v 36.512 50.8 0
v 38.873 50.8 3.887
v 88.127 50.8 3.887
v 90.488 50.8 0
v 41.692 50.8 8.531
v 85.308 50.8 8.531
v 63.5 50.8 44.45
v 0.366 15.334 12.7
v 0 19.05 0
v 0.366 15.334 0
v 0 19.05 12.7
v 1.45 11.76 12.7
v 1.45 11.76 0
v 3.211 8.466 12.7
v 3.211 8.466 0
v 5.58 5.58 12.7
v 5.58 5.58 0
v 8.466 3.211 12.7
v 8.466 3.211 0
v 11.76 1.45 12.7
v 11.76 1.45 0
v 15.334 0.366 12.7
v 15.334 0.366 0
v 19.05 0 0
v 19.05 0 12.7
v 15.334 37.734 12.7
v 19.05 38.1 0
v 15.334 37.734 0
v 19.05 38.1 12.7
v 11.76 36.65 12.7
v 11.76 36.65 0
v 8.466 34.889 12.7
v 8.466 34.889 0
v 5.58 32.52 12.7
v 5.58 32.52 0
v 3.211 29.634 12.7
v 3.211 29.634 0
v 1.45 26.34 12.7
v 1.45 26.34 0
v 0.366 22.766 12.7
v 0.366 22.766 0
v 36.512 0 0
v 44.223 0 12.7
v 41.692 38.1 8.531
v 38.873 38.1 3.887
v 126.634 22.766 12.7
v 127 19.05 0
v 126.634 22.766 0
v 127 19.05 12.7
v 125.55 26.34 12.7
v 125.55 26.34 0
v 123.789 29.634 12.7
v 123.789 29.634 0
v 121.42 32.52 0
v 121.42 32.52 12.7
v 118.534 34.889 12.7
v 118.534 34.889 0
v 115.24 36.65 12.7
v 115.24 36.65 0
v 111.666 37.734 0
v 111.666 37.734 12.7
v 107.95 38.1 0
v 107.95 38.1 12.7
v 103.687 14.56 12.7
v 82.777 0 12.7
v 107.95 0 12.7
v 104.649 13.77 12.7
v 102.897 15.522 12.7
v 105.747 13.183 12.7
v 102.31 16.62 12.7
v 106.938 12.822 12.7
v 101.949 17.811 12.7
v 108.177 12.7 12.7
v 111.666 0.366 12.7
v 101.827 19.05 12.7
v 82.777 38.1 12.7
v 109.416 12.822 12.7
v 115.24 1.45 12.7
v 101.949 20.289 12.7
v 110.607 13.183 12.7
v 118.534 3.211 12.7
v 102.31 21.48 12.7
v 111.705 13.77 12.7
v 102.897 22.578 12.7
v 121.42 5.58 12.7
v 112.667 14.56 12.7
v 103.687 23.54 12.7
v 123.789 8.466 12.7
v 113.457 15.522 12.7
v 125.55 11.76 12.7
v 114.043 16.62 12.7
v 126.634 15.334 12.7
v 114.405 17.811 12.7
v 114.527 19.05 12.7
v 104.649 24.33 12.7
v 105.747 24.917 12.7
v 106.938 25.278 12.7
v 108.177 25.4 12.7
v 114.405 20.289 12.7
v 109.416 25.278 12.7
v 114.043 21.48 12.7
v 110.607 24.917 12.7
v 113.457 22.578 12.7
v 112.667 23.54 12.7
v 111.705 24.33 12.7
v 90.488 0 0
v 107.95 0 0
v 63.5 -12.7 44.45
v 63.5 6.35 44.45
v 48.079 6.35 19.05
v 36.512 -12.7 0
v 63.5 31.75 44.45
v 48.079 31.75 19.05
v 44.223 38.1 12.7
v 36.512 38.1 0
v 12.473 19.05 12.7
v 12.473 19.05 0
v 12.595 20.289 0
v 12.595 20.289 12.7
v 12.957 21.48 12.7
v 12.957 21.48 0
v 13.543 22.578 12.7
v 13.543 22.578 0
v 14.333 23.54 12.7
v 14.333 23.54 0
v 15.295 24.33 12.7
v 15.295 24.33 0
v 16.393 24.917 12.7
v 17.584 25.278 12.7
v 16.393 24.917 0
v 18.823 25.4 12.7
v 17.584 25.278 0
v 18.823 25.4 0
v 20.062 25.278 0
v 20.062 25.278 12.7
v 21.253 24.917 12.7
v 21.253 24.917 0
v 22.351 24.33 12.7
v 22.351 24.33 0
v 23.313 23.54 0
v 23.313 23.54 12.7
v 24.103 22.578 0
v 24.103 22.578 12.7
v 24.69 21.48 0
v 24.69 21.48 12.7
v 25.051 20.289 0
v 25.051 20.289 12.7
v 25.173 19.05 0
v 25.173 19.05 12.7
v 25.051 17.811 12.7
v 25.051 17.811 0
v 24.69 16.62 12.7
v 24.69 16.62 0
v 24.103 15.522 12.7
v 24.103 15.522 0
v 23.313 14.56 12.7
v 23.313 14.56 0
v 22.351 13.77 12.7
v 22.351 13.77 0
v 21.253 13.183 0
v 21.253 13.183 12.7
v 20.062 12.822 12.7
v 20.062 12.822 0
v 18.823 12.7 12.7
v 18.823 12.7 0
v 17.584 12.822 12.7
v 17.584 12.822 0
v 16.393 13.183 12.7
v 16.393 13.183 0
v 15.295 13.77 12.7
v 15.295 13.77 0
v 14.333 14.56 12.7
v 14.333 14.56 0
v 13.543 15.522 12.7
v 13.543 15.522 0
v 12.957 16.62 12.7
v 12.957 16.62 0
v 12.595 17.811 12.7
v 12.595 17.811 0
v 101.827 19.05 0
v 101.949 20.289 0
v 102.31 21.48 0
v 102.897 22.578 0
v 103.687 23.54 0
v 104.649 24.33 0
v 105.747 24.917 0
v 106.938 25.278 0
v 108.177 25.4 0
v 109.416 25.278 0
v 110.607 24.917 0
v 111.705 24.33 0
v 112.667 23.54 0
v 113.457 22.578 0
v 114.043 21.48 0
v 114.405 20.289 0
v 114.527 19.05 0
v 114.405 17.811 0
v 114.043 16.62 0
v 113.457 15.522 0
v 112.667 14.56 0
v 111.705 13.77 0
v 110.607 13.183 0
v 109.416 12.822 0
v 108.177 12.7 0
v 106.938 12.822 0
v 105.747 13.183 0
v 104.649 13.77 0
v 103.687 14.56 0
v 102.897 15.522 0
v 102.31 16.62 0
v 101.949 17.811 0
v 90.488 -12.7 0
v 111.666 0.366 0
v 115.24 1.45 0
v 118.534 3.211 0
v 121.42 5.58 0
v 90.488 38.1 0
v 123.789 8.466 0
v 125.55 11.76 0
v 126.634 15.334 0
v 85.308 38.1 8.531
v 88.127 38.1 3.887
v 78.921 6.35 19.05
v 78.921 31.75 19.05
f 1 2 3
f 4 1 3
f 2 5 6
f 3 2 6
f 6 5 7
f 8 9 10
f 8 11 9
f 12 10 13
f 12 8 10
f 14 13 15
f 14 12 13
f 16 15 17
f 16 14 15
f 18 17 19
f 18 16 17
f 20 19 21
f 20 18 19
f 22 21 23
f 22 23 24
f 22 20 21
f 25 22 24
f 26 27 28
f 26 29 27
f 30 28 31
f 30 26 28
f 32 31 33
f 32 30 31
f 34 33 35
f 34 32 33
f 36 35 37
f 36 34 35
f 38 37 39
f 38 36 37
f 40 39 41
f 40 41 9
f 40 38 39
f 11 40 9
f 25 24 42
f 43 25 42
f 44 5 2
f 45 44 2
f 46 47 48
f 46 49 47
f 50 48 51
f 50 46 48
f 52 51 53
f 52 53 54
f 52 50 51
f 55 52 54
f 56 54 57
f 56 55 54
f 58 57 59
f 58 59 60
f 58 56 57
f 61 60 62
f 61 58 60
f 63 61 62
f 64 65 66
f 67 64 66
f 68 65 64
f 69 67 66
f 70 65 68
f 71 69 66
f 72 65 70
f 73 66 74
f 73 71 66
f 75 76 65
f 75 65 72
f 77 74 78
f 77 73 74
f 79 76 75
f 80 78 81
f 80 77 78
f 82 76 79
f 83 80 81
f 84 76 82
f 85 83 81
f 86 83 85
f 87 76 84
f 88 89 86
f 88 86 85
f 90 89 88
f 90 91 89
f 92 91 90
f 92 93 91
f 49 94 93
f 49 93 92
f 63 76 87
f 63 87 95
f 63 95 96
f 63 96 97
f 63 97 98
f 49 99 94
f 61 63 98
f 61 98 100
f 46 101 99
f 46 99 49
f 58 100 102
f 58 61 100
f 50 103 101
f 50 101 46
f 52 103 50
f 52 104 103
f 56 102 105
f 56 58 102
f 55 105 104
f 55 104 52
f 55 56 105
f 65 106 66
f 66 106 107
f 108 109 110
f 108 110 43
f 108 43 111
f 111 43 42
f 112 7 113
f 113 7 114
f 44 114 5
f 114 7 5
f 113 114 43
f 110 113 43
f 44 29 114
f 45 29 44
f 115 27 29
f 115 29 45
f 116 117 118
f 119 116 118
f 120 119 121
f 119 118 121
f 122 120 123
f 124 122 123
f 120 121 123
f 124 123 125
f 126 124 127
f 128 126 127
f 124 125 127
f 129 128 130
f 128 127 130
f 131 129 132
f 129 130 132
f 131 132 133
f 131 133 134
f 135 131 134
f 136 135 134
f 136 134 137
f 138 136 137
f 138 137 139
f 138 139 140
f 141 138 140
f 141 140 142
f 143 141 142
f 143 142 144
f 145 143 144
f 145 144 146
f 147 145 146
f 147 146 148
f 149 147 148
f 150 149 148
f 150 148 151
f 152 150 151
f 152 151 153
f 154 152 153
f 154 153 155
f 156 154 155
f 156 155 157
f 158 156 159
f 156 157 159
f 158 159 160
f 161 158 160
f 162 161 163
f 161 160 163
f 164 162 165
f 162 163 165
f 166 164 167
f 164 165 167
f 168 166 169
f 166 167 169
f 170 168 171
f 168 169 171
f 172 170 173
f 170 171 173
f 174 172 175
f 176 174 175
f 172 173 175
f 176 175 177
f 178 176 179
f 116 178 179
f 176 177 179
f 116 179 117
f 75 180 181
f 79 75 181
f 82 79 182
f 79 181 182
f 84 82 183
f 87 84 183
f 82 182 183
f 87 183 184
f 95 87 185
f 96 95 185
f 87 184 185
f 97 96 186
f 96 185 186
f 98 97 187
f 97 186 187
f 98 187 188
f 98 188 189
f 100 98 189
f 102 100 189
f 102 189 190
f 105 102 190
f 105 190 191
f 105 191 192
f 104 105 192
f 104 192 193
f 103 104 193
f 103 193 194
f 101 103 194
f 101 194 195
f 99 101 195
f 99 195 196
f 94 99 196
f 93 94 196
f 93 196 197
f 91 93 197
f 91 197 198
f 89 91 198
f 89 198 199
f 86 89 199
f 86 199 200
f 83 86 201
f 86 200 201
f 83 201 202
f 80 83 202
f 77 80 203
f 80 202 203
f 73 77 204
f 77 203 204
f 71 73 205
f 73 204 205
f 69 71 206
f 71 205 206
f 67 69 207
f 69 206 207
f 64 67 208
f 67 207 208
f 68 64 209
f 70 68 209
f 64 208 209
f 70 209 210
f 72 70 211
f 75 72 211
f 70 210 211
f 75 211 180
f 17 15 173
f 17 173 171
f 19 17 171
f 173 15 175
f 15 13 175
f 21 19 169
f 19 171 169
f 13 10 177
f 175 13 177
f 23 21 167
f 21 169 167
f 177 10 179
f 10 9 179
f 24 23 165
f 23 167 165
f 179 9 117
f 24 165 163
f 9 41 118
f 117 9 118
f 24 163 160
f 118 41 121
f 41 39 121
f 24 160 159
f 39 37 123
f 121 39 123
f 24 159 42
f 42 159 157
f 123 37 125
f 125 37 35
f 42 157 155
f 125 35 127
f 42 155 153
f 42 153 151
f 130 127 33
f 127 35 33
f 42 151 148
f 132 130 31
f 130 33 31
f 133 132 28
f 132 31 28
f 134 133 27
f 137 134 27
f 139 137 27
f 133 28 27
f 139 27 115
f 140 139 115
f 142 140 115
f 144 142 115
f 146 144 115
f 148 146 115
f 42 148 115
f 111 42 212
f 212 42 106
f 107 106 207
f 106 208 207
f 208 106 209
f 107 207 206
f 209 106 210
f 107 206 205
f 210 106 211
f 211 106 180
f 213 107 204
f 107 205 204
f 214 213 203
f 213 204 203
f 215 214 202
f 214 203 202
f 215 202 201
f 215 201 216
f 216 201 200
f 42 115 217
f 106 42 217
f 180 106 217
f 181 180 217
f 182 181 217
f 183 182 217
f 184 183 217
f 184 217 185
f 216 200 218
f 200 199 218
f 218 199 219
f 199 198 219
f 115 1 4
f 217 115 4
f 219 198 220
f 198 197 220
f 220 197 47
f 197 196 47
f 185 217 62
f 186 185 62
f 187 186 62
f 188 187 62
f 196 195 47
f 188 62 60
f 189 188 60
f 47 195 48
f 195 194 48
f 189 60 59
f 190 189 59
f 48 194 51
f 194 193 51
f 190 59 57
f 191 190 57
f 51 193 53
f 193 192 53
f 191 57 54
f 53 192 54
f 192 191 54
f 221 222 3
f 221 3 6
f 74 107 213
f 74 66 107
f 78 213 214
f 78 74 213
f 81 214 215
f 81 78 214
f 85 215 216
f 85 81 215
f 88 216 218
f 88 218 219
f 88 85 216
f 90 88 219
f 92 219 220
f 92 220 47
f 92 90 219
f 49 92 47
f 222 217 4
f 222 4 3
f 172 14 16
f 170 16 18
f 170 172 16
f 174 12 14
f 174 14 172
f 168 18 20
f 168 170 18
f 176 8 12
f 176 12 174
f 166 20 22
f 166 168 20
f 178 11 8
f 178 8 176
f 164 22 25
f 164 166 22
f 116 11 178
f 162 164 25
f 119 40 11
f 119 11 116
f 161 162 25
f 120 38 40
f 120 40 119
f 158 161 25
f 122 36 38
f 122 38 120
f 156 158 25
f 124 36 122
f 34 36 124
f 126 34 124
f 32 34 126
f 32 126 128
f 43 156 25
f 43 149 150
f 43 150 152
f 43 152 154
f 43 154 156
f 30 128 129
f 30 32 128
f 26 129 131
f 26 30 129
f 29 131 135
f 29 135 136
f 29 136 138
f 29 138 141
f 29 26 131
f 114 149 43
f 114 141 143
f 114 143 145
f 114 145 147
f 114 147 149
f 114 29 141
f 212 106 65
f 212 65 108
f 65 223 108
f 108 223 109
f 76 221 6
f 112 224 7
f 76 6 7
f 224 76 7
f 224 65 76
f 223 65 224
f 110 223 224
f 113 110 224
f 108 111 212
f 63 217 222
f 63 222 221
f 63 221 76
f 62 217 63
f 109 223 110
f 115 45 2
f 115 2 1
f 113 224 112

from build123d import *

# Parameters (mm, degrees)
F0_W      = 127
F0_H      = 38.1
F1_DEPTH  = 12.7
F3_DEPTH  = 50.8
F5_DEPTH  = 12.7
F6_R      = 19.04999
F8_D      = 12.7
F11_D     = 12.7
F12_W     = 25.4
F12_H     = 25.4
F13_DEPTH = 25.4


# Not quite as in the source:
# - a fillet or chamfer is up to 0.001 mm smaller than in the source, because OpenCascade refuses the exact size


with BuildPart() as f1:
    # F0 (on Top) → F1 (new body)
    with BuildSketch(Plane.XY):
        with Locations((63.5, 19.05)):
            Rectangle(F0_W, F0_H)
    extrude(amount=F1_DEPTH)

    # F2 (on face) → F3 (join)
    with BuildSketch(Plane.XZ):
        Polygon((63.5, 12.7), (63.5, 6.35), (85.3080808081, 8.5308080808), (82.7767857143, 12.7), align=None)
        Polygon((85.3080808081, 8.5308080808), (63.5, 6.35), (88.1273764259, 3.8872623574), align=None)
        Polygon((63.5, 6.35), (63.5, 0), (90.4875, 0), (88.1273764259, 3.8872623574), align=None)
        Polygon((38.8726235741, 3.8872623574), (36.5125, 0), (63.5, 0), (63.5, 6.35), align=None)
        Polygon((41.6919191919, 8.5308080808), (38.8726235741, 3.8872623574), (63.5, 6.35), align=None)
        Polygon((63.5, 12.7), (44.2232142857, 12.7), (41.6919191919, 8.5308080808), (63.5, 6.35), align=None)
        Polygon((63.5, 44.45), (44.2232142857, 12.7), (63.5, 12.7), align=None)
        Polygon((63.5, 44.45), (63.5, 12.7), (82.7767857143, 12.7), align=None)
    extrude(amount=-F3_DEPTH)

    # F4 (on face) → F5 (join)
    with BuildSketch(Plane.XZ):
        Polygon((90.4875, 0), (63.5, 44.45), (36.5125, 0), align=None)
    extrude(amount=F5_DEPTH)

    # F6 (radius 19.05 in the source; OpenCascade refuses exactly that, so slightly less here)
    f6_edges = [f1.edges().sort_by_distance(p)[0] for p in [
        (0, 0, 6.35),
        (0, 38.1, 6.35),
        (127, 38.1, 6.35),
        (127, 0, 6.35),
    ]]
    fillet(f6_edges, radius=F6_R)

    # F8 (through all)
    with Locations(Plane.XY.offset(12.7)):
        with Locations((18.8232142857, 19.05)):
            Hole(F8_D / 2)

    # F11 (through all)
    with Locations(Plane.XY.offset(12.7)):
        with Locations((108.1767857143, 19.05)):
            Hole(F11_D / 2)

    # F12 (on offset) → F13 (cut, symmetric)
    with BuildSketch(Plane.YZ.offset(63.5)):
        with Locations((19.05, 31.75)):
            Rectangle(F12_W, F12_H)
    extrude(amount=F13_DEPTH, both=True, mode=Mode.SUBTRACT)


solid = f1.part
